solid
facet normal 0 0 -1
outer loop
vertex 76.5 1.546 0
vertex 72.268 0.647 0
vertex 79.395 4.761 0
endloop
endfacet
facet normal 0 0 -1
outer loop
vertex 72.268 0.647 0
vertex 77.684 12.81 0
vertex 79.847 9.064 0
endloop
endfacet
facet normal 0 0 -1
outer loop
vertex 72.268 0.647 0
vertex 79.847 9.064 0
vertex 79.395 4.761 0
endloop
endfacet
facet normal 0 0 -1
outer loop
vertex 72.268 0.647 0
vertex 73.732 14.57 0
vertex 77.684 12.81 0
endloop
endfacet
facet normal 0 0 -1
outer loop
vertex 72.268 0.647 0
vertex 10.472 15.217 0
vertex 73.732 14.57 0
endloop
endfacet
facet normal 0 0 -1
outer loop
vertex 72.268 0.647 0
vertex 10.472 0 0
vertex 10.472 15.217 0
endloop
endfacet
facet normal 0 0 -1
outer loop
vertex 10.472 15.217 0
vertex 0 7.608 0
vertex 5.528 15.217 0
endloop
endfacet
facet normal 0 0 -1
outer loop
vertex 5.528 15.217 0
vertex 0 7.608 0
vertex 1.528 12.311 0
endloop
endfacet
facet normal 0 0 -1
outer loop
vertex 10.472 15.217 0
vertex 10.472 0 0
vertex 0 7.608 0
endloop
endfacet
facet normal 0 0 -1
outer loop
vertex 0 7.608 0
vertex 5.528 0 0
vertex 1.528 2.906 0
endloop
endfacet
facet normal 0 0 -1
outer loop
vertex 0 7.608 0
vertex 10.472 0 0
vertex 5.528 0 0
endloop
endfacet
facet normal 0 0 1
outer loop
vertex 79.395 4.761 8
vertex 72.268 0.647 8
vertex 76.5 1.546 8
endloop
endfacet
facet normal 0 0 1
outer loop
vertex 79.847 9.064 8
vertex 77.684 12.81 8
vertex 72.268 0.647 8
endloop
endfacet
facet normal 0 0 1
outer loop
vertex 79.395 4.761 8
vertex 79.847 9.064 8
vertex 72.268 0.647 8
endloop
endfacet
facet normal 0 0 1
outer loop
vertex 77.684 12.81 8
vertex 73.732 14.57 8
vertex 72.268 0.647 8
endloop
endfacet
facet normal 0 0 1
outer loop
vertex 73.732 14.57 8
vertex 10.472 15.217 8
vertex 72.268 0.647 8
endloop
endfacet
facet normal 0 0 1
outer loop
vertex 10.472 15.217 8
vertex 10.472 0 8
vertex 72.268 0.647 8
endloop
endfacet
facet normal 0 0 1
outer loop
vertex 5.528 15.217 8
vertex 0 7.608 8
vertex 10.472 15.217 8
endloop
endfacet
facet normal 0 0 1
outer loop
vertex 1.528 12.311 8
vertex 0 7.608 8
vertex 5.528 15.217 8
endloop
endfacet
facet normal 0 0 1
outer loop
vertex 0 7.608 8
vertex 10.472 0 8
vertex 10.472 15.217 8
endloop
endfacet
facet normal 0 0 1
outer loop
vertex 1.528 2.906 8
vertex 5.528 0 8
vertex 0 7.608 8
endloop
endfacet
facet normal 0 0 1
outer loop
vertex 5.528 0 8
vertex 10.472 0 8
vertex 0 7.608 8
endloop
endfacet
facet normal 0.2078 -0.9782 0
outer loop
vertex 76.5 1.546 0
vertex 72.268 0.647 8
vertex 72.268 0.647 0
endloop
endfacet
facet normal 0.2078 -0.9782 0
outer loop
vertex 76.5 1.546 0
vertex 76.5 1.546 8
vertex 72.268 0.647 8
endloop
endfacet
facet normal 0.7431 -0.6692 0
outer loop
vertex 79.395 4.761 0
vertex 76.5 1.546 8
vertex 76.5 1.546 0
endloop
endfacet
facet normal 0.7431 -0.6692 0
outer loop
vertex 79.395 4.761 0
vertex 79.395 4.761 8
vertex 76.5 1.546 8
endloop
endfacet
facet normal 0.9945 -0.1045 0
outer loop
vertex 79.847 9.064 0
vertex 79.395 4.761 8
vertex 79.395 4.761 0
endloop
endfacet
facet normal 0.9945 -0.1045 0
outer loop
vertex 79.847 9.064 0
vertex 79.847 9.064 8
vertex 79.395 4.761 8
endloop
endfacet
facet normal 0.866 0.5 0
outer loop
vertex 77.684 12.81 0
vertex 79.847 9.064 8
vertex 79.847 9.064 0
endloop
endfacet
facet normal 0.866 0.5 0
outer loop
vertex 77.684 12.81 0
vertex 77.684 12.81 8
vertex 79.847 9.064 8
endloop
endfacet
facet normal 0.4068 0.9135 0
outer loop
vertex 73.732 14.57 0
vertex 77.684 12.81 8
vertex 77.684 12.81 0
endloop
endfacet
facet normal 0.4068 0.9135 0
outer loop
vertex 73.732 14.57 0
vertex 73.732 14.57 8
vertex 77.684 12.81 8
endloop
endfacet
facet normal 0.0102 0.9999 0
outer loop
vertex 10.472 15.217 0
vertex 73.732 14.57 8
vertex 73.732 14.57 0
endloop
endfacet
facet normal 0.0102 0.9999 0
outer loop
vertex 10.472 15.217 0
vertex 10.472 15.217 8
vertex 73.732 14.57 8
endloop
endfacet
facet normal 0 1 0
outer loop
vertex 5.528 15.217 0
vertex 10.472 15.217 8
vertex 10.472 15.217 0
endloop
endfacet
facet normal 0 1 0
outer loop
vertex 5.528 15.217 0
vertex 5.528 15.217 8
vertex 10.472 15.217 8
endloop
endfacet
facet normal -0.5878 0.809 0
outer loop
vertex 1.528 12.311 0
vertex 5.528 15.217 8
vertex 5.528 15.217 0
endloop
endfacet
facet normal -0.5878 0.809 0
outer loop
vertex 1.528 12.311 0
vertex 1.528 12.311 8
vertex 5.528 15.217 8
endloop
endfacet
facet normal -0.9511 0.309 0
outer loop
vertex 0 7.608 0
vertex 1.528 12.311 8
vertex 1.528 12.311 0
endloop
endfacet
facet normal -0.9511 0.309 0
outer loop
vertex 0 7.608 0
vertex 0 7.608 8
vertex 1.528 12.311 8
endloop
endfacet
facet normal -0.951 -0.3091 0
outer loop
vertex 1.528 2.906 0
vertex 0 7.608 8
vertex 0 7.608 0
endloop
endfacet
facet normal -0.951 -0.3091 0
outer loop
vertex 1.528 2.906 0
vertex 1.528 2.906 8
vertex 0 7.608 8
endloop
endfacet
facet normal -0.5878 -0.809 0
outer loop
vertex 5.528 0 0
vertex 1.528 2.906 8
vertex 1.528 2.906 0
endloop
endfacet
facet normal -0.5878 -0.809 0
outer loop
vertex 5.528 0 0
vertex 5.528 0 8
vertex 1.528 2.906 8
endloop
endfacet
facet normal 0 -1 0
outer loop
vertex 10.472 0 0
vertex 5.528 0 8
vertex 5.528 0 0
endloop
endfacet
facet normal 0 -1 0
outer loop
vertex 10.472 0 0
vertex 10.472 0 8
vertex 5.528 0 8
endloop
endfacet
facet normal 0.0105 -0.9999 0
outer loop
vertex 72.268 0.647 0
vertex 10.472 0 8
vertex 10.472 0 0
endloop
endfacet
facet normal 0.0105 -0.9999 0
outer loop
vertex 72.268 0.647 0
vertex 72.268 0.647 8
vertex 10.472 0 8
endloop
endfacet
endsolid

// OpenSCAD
$fn = 32;

// ----------------------------------------------------------------------
// Lever arm: two bosses 16 and 14 mm, 65 mm between centres
// ----------------------------------------------------------------------

// --- parameters (mm) ---
profile_height = 8;       // extrusion height
profile_points = 13;      // points of the closed outline

profile = [[0, 7.608], [1.528, 2.906], [5.528, 0], [10.472, 0], [72.268, 0.647], [76.5, 1.546], [79.395, 4.761], [79.847, 9.064], [77.684, 12.81], [73.732, 14.57], [10.472, 15.217], [5.528, 15.217], [1.528, 12.311]];  // single closed polygon, 13 points, counter clockwise

// --- the one profile operation ---
linear_extrude(height = profile_height) polygon(points = profile);
